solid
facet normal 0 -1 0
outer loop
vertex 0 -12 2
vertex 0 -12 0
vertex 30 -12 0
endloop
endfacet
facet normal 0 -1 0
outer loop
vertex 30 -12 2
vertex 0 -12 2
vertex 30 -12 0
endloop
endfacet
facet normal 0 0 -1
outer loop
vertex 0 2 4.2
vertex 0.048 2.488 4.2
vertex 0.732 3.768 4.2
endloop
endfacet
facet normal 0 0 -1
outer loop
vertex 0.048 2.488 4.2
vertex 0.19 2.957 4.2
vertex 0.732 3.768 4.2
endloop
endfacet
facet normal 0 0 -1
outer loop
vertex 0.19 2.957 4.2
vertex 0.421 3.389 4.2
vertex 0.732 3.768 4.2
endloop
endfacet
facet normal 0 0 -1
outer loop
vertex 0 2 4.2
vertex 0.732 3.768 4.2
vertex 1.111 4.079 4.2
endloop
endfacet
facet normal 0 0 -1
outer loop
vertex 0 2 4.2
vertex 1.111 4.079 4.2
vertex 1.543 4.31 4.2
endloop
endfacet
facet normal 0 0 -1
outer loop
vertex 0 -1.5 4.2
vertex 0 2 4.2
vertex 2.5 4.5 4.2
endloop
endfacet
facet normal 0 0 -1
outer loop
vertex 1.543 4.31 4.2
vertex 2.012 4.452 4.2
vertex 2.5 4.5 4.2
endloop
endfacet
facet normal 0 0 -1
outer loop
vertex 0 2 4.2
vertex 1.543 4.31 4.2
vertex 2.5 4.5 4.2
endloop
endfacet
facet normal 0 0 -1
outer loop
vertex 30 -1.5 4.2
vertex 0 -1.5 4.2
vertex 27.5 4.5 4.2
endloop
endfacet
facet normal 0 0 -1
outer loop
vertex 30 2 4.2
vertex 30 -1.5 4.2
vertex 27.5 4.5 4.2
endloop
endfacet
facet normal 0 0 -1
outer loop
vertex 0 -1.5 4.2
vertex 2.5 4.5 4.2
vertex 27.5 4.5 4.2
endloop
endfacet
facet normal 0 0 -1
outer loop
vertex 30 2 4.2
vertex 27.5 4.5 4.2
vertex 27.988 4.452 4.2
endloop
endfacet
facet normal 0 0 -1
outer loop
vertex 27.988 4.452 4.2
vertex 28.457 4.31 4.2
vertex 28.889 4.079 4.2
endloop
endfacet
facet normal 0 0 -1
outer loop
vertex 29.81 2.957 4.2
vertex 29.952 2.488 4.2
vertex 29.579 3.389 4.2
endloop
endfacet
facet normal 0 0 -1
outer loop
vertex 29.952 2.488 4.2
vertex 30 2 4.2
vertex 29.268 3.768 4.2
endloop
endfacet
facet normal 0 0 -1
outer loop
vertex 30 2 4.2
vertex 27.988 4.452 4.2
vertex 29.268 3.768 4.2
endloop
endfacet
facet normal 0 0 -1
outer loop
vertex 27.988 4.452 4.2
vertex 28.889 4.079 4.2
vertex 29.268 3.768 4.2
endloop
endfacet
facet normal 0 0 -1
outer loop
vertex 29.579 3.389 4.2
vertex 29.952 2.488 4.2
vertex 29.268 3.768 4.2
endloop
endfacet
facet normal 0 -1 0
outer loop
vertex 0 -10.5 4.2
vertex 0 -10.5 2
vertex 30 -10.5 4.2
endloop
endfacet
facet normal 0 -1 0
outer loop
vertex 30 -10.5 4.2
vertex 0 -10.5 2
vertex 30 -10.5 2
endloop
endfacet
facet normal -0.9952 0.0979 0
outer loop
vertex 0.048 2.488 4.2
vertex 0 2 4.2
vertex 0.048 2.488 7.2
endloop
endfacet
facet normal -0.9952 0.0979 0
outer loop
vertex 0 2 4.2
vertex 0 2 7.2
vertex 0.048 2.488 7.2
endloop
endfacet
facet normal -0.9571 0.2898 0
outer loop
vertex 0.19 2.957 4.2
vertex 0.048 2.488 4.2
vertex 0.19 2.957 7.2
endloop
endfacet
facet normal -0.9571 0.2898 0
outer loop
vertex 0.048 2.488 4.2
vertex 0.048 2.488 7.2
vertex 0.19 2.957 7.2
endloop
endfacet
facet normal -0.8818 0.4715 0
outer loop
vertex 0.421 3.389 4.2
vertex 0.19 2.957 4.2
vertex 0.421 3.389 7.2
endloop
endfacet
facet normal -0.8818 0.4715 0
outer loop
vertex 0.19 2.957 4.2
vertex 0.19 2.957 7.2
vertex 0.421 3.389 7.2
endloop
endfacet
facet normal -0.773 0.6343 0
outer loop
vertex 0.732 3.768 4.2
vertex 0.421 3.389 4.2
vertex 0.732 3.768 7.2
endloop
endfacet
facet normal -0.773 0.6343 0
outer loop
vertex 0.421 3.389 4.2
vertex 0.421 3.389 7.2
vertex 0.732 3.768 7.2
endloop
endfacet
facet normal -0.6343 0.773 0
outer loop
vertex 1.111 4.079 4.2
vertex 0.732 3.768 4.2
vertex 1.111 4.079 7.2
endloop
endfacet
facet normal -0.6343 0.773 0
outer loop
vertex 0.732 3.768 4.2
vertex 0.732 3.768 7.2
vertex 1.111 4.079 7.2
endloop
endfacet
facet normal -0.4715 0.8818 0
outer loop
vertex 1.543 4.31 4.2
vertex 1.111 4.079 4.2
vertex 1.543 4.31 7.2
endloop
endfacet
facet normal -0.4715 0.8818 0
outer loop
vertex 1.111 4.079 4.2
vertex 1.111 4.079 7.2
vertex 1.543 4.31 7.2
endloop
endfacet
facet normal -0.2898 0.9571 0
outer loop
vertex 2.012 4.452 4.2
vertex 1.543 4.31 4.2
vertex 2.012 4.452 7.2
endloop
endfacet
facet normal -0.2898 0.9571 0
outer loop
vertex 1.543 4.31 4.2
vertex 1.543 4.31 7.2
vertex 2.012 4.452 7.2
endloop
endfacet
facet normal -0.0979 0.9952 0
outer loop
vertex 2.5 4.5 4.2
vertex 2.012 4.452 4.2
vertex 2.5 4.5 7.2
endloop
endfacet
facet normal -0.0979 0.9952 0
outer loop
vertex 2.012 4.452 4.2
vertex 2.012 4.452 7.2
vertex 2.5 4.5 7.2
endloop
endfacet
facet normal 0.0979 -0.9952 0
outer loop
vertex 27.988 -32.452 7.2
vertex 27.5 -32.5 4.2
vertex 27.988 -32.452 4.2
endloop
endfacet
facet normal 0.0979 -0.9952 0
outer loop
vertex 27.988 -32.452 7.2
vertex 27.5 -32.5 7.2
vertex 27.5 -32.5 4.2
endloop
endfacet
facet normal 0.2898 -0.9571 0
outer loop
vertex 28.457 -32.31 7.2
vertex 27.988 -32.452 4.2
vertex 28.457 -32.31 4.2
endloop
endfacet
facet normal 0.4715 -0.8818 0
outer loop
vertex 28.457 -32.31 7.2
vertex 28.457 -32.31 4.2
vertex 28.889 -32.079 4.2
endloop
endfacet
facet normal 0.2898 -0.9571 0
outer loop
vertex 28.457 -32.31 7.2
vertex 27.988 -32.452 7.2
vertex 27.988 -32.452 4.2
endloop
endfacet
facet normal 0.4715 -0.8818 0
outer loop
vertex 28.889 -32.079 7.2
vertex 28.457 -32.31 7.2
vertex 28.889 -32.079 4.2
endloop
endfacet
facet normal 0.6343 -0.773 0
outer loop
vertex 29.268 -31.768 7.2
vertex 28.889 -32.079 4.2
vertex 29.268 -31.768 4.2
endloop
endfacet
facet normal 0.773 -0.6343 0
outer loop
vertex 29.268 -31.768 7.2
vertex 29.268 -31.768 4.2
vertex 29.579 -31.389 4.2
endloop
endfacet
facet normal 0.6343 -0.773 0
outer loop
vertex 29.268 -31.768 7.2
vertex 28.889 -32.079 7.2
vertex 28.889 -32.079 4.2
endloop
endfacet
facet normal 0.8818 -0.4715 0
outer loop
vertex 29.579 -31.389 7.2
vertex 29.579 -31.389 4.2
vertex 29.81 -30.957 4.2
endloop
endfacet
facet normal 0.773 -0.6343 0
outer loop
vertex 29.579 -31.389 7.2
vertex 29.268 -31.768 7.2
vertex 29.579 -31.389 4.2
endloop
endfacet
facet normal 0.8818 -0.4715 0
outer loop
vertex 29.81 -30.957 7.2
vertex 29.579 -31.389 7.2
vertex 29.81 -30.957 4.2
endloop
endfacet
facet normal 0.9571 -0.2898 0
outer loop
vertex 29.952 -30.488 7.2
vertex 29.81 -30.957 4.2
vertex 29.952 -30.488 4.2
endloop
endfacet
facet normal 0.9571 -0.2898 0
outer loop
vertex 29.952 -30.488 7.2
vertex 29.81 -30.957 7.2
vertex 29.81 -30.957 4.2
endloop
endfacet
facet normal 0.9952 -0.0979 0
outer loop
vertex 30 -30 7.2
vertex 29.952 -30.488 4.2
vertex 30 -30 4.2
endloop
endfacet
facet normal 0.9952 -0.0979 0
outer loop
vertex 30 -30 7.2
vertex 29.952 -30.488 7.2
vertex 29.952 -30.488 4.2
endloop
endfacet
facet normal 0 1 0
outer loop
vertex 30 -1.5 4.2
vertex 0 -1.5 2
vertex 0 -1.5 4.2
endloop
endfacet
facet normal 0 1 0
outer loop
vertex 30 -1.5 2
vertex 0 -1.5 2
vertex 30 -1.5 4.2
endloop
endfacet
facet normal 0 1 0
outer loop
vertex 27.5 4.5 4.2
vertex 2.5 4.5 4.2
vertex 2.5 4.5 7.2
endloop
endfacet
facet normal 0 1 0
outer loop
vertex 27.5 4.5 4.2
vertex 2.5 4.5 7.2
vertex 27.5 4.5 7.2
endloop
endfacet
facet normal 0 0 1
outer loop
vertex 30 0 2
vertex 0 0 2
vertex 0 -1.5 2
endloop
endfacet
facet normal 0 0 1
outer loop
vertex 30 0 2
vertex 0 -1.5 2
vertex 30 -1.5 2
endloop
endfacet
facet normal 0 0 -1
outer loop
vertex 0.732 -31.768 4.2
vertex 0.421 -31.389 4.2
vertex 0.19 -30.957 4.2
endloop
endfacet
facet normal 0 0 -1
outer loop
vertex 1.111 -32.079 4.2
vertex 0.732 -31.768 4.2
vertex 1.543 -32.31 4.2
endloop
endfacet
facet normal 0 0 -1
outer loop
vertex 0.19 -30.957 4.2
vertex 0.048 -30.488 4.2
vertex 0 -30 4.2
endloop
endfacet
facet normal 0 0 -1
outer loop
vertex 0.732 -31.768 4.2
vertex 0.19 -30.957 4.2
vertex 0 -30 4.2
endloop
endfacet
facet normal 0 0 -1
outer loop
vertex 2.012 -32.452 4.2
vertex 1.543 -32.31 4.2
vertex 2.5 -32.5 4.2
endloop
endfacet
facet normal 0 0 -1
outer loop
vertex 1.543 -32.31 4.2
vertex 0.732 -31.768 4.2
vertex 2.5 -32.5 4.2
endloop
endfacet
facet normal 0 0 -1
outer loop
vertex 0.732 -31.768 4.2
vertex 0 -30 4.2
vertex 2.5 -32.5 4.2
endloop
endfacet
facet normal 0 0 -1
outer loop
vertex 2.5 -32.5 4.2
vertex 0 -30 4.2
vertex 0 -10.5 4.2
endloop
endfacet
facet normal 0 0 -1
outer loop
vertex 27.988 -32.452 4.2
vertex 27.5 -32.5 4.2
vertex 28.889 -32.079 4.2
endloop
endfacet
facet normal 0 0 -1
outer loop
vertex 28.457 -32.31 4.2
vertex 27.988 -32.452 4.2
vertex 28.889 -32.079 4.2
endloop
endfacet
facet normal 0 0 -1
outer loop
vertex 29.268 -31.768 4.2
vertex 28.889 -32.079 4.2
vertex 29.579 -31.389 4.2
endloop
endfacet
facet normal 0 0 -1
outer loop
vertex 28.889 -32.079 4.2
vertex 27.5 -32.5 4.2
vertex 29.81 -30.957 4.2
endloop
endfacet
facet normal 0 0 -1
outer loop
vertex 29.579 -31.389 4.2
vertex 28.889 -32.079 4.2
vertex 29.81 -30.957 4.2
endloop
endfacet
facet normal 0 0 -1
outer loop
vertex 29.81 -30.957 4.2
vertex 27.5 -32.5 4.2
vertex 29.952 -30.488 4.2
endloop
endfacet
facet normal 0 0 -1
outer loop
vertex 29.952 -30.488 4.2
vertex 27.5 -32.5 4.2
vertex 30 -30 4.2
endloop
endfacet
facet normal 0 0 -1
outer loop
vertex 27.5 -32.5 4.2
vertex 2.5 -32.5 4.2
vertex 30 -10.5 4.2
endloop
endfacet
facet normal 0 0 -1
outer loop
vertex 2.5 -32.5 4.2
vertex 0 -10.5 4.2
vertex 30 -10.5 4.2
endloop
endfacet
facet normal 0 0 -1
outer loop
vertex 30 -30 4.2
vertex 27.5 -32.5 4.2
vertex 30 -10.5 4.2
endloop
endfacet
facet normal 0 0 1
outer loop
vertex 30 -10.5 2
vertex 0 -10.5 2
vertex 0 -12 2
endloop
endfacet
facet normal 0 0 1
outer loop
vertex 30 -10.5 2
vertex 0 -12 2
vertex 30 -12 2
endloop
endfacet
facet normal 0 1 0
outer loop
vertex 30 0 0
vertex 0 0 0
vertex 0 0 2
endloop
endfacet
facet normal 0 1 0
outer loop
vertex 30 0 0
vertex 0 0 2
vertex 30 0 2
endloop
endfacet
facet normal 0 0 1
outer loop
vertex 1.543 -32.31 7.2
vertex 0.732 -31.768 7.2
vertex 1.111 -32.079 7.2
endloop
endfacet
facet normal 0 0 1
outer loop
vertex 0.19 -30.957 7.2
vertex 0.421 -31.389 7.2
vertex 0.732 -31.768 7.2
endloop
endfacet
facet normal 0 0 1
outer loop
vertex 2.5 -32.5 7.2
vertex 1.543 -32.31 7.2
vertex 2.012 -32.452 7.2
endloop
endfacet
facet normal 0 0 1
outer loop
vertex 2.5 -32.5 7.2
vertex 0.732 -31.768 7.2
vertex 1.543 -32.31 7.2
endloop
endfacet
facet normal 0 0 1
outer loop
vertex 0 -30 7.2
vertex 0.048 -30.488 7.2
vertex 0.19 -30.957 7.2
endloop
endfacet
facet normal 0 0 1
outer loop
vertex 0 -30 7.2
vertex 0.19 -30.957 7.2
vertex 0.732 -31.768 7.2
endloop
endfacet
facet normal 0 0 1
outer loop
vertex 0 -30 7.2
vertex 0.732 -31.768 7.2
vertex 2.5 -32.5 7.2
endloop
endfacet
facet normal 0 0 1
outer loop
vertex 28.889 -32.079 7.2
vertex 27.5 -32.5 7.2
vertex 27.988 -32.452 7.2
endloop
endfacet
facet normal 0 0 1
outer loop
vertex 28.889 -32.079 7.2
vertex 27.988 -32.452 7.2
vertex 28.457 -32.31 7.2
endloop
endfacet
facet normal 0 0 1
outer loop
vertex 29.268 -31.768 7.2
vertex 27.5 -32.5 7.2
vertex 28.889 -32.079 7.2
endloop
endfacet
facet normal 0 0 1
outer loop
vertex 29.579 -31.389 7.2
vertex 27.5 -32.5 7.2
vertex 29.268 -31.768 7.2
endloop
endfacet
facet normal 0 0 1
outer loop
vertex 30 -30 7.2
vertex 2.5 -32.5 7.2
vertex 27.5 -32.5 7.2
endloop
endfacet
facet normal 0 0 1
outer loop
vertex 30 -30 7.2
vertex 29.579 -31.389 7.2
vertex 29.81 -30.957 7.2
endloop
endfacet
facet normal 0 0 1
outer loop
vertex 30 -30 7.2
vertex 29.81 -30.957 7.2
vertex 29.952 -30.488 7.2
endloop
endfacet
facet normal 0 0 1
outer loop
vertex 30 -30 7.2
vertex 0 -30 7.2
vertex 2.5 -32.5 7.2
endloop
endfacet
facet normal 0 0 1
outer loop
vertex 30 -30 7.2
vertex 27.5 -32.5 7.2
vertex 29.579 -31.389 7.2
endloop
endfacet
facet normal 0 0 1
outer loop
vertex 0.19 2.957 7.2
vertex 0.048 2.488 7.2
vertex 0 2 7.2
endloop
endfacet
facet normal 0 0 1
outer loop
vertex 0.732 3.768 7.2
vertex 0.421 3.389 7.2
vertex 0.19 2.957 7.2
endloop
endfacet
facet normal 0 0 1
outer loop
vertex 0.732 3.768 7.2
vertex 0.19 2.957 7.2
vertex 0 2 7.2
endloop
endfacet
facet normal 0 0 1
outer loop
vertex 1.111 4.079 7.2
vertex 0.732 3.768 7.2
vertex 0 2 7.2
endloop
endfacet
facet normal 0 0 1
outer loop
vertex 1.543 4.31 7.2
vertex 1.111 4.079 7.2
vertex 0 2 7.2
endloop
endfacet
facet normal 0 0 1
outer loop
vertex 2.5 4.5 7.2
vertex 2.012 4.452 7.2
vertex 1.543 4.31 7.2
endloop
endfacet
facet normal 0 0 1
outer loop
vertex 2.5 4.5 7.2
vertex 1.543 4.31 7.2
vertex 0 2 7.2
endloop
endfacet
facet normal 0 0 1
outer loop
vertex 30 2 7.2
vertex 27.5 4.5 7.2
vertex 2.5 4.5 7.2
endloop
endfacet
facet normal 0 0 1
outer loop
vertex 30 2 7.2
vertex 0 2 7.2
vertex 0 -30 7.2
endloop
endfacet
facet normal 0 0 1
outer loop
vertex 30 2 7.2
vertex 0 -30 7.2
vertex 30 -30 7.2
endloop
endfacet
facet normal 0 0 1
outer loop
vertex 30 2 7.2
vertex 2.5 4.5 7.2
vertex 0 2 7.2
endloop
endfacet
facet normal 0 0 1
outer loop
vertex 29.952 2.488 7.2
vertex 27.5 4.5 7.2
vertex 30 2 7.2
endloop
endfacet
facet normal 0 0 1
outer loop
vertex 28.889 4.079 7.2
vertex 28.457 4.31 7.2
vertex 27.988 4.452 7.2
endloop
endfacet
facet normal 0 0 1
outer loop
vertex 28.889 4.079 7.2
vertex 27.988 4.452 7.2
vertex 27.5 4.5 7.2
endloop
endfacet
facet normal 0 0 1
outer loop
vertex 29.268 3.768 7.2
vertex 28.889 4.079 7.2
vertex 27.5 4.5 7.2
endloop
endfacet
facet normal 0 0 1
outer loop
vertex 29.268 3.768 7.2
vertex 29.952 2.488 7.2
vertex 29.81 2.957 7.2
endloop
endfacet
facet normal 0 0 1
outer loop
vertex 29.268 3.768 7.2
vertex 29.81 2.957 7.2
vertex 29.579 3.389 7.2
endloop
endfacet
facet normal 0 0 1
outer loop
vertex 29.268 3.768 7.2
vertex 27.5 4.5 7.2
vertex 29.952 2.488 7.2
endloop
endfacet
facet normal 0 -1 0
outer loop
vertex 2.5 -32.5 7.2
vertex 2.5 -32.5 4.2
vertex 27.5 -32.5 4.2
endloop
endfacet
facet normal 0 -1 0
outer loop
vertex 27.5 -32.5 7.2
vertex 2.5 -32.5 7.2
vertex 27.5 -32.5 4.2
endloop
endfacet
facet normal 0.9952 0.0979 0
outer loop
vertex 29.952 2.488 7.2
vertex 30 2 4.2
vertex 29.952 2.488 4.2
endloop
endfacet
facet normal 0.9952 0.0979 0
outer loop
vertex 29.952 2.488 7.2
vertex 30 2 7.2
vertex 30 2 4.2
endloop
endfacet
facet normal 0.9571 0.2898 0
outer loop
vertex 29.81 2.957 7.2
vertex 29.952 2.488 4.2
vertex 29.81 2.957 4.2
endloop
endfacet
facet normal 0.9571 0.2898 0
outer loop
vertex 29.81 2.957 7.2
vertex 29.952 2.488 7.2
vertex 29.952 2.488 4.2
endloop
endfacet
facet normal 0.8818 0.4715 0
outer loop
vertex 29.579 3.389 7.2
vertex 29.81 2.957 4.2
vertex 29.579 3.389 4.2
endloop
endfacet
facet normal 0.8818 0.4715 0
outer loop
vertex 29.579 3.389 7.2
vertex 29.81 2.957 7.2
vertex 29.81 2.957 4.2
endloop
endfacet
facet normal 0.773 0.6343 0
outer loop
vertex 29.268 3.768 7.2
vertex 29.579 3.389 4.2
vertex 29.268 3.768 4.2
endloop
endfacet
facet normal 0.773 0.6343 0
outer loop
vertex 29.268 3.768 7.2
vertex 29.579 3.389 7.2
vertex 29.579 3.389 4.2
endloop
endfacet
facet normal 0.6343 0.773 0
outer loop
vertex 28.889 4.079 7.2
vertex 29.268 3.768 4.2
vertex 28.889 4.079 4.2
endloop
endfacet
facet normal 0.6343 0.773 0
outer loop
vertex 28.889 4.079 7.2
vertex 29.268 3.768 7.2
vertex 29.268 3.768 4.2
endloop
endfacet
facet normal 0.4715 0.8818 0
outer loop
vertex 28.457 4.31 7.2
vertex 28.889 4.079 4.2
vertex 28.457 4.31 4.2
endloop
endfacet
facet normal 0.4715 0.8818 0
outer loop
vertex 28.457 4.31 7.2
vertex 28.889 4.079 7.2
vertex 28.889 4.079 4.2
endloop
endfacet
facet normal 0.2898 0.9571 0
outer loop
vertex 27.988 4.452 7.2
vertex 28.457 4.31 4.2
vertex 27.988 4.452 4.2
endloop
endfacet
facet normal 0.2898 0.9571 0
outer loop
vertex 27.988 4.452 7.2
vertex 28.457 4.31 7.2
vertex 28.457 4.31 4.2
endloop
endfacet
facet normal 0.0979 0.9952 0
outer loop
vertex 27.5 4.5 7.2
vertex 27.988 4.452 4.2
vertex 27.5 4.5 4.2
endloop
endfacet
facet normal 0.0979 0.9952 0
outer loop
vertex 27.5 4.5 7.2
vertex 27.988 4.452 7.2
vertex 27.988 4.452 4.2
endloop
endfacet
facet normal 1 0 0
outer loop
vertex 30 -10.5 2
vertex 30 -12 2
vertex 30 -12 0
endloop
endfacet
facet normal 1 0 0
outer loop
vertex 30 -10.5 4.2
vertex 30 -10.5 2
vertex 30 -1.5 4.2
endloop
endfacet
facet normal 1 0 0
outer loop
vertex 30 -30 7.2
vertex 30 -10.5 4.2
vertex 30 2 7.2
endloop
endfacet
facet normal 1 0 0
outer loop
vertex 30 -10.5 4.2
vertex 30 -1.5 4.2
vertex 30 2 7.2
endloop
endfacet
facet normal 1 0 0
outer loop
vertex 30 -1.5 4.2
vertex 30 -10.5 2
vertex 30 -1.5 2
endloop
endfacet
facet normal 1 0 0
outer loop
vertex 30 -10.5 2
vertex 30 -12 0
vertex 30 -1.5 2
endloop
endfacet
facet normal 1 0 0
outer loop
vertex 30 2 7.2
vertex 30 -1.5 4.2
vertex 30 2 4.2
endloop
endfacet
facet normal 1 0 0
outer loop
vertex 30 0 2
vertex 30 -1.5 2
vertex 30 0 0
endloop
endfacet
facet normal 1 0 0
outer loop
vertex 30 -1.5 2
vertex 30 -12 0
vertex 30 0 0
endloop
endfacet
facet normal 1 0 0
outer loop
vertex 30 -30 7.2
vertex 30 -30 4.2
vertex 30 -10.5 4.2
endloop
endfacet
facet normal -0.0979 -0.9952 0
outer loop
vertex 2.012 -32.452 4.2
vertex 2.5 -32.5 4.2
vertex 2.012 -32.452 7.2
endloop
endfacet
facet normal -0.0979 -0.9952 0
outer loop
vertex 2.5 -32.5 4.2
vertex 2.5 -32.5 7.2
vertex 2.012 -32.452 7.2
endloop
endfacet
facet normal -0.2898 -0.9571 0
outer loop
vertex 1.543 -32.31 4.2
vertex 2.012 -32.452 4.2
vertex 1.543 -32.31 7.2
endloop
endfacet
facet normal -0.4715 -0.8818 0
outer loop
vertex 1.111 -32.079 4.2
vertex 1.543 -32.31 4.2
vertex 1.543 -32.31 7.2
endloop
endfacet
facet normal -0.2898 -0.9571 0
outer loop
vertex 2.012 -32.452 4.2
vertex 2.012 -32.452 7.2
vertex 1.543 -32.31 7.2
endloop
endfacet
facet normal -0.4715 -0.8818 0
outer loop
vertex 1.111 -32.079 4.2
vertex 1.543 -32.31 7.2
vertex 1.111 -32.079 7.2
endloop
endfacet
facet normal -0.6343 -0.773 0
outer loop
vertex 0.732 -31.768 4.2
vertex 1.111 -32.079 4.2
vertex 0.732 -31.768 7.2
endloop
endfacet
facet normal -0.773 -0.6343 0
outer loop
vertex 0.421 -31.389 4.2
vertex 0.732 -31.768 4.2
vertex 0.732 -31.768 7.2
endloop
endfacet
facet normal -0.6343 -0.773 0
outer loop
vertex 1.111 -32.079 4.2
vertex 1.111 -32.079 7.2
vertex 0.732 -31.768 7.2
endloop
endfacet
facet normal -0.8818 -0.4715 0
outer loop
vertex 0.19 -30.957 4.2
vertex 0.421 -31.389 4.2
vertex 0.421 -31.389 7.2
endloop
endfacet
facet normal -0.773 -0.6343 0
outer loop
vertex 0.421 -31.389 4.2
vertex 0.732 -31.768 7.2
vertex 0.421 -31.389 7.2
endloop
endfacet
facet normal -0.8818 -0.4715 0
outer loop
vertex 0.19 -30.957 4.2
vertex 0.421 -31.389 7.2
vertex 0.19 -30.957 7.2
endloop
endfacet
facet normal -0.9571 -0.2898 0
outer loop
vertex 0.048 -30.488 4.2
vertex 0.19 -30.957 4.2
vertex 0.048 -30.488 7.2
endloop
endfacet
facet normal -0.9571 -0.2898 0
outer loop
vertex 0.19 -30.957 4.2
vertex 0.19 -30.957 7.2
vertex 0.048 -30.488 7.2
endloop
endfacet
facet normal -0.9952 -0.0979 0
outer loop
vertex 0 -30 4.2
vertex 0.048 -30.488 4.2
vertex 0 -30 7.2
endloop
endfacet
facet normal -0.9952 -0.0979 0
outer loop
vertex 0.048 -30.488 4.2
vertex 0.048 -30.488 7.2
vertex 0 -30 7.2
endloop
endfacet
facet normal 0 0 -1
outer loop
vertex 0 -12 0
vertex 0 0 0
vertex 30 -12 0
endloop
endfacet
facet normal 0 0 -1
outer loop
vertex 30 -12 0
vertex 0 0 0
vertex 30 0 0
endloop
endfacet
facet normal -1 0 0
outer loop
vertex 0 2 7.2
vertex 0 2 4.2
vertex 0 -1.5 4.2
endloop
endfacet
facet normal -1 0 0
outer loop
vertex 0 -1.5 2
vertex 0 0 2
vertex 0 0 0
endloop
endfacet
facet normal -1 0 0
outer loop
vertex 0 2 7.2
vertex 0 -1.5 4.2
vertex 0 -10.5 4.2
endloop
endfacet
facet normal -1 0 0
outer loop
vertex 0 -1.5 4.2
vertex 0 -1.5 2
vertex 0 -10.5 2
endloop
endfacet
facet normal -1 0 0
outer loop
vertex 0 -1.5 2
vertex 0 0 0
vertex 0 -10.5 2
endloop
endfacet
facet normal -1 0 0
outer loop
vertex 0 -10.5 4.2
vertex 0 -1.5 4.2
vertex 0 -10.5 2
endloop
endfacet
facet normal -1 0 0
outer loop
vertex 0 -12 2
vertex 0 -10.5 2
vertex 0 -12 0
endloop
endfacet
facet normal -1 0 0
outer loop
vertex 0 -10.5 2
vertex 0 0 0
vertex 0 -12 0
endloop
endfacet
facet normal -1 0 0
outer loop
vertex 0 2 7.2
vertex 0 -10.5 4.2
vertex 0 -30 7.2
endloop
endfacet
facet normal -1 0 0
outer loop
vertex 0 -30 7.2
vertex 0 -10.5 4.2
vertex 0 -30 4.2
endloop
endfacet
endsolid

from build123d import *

# Parameters (mm, degrees)
F0_W     = 30
F0_H     = 12
F1_DEPTH = 2
F2_W     = 30
F2_H     = 9
F3_DEPTH = 2.2
F4_W     = 30
F4_H     = 22
F4_H_2   = 9
F4_H_3   = 6
F5_DEPTH = 3
F6_R     = 2.5


with BuildPart() as f1:
    # F0 (on Top) → F1 (new body)
    with BuildSketch(Plane.XY):
        with Locations((15, -6)):
            Rectangle(F0_W, F0_H)
    extrude(amount=F1_DEPTH)

    # F2 (on face) → F3 (join)
    with BuildSketch(Plane.XY.offset(2)):
        with Locations((15, -6)):
            Rectangle(F2_W, F2_H)
    extrude(amount=F3_DEPTH)

    # F4 (on face) → F5 (join)
    with BuildSketch(Plane.XY.offset(4.2)):
        with Locations((15, -21.5)):
            Rectangle(F4_W, F4_H)
        with Locations((15, -6)):
            Rectangle(F4_W, F4_H_2)
        with Locations((15, 1.5)):
            Rectangle(F4_W, F4_H_3)
    extrude(amount=F5_DEPTH)

    # F6
    f6_edges = [f1.edges().sort_by_distance(p)[0] for p in [
        (0, -32.5, 5.7),
        (30, -32.5, 5.7),
        (30, 4.5, 5.7),
        (0, 4.5, 5.7),
    ]]
    fillet(f6_edges, radius=F6_R)


solid = f1.part
